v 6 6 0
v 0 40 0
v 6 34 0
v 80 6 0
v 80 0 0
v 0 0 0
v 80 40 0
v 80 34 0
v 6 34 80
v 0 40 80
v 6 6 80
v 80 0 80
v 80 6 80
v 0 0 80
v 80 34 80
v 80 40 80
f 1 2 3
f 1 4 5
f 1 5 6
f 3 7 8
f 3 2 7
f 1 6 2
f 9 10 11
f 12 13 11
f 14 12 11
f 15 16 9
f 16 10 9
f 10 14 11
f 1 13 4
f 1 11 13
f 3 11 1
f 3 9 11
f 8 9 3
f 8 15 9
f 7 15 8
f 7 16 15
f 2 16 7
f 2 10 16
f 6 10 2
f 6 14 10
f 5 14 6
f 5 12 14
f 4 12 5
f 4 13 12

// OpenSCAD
$fn = 32;

// ----------------------------------------------------------------------
// Structural section: channel 80 x 40 mm
// ----------------------------------------------------------------------

// --- parameters (mm) ---
sec_w = 80;               // channel width, X
sec_h = 40;               // channel height, Y
flange_t = 6;             // flange thickness
web_t = 6;                // web thickness
plate_t = 80;             // cut length, Z (extrusion height)

profile = [[0, 0], [80, 0], [80, 6], [6, 6], [6, 34], [80, 34], [80, 40], [0, 40]];  // primary outline, 8 points, counter clockwise

// --- the one profile operation ---
linear_extrude(height = plate_t) polygon(points = profile);
